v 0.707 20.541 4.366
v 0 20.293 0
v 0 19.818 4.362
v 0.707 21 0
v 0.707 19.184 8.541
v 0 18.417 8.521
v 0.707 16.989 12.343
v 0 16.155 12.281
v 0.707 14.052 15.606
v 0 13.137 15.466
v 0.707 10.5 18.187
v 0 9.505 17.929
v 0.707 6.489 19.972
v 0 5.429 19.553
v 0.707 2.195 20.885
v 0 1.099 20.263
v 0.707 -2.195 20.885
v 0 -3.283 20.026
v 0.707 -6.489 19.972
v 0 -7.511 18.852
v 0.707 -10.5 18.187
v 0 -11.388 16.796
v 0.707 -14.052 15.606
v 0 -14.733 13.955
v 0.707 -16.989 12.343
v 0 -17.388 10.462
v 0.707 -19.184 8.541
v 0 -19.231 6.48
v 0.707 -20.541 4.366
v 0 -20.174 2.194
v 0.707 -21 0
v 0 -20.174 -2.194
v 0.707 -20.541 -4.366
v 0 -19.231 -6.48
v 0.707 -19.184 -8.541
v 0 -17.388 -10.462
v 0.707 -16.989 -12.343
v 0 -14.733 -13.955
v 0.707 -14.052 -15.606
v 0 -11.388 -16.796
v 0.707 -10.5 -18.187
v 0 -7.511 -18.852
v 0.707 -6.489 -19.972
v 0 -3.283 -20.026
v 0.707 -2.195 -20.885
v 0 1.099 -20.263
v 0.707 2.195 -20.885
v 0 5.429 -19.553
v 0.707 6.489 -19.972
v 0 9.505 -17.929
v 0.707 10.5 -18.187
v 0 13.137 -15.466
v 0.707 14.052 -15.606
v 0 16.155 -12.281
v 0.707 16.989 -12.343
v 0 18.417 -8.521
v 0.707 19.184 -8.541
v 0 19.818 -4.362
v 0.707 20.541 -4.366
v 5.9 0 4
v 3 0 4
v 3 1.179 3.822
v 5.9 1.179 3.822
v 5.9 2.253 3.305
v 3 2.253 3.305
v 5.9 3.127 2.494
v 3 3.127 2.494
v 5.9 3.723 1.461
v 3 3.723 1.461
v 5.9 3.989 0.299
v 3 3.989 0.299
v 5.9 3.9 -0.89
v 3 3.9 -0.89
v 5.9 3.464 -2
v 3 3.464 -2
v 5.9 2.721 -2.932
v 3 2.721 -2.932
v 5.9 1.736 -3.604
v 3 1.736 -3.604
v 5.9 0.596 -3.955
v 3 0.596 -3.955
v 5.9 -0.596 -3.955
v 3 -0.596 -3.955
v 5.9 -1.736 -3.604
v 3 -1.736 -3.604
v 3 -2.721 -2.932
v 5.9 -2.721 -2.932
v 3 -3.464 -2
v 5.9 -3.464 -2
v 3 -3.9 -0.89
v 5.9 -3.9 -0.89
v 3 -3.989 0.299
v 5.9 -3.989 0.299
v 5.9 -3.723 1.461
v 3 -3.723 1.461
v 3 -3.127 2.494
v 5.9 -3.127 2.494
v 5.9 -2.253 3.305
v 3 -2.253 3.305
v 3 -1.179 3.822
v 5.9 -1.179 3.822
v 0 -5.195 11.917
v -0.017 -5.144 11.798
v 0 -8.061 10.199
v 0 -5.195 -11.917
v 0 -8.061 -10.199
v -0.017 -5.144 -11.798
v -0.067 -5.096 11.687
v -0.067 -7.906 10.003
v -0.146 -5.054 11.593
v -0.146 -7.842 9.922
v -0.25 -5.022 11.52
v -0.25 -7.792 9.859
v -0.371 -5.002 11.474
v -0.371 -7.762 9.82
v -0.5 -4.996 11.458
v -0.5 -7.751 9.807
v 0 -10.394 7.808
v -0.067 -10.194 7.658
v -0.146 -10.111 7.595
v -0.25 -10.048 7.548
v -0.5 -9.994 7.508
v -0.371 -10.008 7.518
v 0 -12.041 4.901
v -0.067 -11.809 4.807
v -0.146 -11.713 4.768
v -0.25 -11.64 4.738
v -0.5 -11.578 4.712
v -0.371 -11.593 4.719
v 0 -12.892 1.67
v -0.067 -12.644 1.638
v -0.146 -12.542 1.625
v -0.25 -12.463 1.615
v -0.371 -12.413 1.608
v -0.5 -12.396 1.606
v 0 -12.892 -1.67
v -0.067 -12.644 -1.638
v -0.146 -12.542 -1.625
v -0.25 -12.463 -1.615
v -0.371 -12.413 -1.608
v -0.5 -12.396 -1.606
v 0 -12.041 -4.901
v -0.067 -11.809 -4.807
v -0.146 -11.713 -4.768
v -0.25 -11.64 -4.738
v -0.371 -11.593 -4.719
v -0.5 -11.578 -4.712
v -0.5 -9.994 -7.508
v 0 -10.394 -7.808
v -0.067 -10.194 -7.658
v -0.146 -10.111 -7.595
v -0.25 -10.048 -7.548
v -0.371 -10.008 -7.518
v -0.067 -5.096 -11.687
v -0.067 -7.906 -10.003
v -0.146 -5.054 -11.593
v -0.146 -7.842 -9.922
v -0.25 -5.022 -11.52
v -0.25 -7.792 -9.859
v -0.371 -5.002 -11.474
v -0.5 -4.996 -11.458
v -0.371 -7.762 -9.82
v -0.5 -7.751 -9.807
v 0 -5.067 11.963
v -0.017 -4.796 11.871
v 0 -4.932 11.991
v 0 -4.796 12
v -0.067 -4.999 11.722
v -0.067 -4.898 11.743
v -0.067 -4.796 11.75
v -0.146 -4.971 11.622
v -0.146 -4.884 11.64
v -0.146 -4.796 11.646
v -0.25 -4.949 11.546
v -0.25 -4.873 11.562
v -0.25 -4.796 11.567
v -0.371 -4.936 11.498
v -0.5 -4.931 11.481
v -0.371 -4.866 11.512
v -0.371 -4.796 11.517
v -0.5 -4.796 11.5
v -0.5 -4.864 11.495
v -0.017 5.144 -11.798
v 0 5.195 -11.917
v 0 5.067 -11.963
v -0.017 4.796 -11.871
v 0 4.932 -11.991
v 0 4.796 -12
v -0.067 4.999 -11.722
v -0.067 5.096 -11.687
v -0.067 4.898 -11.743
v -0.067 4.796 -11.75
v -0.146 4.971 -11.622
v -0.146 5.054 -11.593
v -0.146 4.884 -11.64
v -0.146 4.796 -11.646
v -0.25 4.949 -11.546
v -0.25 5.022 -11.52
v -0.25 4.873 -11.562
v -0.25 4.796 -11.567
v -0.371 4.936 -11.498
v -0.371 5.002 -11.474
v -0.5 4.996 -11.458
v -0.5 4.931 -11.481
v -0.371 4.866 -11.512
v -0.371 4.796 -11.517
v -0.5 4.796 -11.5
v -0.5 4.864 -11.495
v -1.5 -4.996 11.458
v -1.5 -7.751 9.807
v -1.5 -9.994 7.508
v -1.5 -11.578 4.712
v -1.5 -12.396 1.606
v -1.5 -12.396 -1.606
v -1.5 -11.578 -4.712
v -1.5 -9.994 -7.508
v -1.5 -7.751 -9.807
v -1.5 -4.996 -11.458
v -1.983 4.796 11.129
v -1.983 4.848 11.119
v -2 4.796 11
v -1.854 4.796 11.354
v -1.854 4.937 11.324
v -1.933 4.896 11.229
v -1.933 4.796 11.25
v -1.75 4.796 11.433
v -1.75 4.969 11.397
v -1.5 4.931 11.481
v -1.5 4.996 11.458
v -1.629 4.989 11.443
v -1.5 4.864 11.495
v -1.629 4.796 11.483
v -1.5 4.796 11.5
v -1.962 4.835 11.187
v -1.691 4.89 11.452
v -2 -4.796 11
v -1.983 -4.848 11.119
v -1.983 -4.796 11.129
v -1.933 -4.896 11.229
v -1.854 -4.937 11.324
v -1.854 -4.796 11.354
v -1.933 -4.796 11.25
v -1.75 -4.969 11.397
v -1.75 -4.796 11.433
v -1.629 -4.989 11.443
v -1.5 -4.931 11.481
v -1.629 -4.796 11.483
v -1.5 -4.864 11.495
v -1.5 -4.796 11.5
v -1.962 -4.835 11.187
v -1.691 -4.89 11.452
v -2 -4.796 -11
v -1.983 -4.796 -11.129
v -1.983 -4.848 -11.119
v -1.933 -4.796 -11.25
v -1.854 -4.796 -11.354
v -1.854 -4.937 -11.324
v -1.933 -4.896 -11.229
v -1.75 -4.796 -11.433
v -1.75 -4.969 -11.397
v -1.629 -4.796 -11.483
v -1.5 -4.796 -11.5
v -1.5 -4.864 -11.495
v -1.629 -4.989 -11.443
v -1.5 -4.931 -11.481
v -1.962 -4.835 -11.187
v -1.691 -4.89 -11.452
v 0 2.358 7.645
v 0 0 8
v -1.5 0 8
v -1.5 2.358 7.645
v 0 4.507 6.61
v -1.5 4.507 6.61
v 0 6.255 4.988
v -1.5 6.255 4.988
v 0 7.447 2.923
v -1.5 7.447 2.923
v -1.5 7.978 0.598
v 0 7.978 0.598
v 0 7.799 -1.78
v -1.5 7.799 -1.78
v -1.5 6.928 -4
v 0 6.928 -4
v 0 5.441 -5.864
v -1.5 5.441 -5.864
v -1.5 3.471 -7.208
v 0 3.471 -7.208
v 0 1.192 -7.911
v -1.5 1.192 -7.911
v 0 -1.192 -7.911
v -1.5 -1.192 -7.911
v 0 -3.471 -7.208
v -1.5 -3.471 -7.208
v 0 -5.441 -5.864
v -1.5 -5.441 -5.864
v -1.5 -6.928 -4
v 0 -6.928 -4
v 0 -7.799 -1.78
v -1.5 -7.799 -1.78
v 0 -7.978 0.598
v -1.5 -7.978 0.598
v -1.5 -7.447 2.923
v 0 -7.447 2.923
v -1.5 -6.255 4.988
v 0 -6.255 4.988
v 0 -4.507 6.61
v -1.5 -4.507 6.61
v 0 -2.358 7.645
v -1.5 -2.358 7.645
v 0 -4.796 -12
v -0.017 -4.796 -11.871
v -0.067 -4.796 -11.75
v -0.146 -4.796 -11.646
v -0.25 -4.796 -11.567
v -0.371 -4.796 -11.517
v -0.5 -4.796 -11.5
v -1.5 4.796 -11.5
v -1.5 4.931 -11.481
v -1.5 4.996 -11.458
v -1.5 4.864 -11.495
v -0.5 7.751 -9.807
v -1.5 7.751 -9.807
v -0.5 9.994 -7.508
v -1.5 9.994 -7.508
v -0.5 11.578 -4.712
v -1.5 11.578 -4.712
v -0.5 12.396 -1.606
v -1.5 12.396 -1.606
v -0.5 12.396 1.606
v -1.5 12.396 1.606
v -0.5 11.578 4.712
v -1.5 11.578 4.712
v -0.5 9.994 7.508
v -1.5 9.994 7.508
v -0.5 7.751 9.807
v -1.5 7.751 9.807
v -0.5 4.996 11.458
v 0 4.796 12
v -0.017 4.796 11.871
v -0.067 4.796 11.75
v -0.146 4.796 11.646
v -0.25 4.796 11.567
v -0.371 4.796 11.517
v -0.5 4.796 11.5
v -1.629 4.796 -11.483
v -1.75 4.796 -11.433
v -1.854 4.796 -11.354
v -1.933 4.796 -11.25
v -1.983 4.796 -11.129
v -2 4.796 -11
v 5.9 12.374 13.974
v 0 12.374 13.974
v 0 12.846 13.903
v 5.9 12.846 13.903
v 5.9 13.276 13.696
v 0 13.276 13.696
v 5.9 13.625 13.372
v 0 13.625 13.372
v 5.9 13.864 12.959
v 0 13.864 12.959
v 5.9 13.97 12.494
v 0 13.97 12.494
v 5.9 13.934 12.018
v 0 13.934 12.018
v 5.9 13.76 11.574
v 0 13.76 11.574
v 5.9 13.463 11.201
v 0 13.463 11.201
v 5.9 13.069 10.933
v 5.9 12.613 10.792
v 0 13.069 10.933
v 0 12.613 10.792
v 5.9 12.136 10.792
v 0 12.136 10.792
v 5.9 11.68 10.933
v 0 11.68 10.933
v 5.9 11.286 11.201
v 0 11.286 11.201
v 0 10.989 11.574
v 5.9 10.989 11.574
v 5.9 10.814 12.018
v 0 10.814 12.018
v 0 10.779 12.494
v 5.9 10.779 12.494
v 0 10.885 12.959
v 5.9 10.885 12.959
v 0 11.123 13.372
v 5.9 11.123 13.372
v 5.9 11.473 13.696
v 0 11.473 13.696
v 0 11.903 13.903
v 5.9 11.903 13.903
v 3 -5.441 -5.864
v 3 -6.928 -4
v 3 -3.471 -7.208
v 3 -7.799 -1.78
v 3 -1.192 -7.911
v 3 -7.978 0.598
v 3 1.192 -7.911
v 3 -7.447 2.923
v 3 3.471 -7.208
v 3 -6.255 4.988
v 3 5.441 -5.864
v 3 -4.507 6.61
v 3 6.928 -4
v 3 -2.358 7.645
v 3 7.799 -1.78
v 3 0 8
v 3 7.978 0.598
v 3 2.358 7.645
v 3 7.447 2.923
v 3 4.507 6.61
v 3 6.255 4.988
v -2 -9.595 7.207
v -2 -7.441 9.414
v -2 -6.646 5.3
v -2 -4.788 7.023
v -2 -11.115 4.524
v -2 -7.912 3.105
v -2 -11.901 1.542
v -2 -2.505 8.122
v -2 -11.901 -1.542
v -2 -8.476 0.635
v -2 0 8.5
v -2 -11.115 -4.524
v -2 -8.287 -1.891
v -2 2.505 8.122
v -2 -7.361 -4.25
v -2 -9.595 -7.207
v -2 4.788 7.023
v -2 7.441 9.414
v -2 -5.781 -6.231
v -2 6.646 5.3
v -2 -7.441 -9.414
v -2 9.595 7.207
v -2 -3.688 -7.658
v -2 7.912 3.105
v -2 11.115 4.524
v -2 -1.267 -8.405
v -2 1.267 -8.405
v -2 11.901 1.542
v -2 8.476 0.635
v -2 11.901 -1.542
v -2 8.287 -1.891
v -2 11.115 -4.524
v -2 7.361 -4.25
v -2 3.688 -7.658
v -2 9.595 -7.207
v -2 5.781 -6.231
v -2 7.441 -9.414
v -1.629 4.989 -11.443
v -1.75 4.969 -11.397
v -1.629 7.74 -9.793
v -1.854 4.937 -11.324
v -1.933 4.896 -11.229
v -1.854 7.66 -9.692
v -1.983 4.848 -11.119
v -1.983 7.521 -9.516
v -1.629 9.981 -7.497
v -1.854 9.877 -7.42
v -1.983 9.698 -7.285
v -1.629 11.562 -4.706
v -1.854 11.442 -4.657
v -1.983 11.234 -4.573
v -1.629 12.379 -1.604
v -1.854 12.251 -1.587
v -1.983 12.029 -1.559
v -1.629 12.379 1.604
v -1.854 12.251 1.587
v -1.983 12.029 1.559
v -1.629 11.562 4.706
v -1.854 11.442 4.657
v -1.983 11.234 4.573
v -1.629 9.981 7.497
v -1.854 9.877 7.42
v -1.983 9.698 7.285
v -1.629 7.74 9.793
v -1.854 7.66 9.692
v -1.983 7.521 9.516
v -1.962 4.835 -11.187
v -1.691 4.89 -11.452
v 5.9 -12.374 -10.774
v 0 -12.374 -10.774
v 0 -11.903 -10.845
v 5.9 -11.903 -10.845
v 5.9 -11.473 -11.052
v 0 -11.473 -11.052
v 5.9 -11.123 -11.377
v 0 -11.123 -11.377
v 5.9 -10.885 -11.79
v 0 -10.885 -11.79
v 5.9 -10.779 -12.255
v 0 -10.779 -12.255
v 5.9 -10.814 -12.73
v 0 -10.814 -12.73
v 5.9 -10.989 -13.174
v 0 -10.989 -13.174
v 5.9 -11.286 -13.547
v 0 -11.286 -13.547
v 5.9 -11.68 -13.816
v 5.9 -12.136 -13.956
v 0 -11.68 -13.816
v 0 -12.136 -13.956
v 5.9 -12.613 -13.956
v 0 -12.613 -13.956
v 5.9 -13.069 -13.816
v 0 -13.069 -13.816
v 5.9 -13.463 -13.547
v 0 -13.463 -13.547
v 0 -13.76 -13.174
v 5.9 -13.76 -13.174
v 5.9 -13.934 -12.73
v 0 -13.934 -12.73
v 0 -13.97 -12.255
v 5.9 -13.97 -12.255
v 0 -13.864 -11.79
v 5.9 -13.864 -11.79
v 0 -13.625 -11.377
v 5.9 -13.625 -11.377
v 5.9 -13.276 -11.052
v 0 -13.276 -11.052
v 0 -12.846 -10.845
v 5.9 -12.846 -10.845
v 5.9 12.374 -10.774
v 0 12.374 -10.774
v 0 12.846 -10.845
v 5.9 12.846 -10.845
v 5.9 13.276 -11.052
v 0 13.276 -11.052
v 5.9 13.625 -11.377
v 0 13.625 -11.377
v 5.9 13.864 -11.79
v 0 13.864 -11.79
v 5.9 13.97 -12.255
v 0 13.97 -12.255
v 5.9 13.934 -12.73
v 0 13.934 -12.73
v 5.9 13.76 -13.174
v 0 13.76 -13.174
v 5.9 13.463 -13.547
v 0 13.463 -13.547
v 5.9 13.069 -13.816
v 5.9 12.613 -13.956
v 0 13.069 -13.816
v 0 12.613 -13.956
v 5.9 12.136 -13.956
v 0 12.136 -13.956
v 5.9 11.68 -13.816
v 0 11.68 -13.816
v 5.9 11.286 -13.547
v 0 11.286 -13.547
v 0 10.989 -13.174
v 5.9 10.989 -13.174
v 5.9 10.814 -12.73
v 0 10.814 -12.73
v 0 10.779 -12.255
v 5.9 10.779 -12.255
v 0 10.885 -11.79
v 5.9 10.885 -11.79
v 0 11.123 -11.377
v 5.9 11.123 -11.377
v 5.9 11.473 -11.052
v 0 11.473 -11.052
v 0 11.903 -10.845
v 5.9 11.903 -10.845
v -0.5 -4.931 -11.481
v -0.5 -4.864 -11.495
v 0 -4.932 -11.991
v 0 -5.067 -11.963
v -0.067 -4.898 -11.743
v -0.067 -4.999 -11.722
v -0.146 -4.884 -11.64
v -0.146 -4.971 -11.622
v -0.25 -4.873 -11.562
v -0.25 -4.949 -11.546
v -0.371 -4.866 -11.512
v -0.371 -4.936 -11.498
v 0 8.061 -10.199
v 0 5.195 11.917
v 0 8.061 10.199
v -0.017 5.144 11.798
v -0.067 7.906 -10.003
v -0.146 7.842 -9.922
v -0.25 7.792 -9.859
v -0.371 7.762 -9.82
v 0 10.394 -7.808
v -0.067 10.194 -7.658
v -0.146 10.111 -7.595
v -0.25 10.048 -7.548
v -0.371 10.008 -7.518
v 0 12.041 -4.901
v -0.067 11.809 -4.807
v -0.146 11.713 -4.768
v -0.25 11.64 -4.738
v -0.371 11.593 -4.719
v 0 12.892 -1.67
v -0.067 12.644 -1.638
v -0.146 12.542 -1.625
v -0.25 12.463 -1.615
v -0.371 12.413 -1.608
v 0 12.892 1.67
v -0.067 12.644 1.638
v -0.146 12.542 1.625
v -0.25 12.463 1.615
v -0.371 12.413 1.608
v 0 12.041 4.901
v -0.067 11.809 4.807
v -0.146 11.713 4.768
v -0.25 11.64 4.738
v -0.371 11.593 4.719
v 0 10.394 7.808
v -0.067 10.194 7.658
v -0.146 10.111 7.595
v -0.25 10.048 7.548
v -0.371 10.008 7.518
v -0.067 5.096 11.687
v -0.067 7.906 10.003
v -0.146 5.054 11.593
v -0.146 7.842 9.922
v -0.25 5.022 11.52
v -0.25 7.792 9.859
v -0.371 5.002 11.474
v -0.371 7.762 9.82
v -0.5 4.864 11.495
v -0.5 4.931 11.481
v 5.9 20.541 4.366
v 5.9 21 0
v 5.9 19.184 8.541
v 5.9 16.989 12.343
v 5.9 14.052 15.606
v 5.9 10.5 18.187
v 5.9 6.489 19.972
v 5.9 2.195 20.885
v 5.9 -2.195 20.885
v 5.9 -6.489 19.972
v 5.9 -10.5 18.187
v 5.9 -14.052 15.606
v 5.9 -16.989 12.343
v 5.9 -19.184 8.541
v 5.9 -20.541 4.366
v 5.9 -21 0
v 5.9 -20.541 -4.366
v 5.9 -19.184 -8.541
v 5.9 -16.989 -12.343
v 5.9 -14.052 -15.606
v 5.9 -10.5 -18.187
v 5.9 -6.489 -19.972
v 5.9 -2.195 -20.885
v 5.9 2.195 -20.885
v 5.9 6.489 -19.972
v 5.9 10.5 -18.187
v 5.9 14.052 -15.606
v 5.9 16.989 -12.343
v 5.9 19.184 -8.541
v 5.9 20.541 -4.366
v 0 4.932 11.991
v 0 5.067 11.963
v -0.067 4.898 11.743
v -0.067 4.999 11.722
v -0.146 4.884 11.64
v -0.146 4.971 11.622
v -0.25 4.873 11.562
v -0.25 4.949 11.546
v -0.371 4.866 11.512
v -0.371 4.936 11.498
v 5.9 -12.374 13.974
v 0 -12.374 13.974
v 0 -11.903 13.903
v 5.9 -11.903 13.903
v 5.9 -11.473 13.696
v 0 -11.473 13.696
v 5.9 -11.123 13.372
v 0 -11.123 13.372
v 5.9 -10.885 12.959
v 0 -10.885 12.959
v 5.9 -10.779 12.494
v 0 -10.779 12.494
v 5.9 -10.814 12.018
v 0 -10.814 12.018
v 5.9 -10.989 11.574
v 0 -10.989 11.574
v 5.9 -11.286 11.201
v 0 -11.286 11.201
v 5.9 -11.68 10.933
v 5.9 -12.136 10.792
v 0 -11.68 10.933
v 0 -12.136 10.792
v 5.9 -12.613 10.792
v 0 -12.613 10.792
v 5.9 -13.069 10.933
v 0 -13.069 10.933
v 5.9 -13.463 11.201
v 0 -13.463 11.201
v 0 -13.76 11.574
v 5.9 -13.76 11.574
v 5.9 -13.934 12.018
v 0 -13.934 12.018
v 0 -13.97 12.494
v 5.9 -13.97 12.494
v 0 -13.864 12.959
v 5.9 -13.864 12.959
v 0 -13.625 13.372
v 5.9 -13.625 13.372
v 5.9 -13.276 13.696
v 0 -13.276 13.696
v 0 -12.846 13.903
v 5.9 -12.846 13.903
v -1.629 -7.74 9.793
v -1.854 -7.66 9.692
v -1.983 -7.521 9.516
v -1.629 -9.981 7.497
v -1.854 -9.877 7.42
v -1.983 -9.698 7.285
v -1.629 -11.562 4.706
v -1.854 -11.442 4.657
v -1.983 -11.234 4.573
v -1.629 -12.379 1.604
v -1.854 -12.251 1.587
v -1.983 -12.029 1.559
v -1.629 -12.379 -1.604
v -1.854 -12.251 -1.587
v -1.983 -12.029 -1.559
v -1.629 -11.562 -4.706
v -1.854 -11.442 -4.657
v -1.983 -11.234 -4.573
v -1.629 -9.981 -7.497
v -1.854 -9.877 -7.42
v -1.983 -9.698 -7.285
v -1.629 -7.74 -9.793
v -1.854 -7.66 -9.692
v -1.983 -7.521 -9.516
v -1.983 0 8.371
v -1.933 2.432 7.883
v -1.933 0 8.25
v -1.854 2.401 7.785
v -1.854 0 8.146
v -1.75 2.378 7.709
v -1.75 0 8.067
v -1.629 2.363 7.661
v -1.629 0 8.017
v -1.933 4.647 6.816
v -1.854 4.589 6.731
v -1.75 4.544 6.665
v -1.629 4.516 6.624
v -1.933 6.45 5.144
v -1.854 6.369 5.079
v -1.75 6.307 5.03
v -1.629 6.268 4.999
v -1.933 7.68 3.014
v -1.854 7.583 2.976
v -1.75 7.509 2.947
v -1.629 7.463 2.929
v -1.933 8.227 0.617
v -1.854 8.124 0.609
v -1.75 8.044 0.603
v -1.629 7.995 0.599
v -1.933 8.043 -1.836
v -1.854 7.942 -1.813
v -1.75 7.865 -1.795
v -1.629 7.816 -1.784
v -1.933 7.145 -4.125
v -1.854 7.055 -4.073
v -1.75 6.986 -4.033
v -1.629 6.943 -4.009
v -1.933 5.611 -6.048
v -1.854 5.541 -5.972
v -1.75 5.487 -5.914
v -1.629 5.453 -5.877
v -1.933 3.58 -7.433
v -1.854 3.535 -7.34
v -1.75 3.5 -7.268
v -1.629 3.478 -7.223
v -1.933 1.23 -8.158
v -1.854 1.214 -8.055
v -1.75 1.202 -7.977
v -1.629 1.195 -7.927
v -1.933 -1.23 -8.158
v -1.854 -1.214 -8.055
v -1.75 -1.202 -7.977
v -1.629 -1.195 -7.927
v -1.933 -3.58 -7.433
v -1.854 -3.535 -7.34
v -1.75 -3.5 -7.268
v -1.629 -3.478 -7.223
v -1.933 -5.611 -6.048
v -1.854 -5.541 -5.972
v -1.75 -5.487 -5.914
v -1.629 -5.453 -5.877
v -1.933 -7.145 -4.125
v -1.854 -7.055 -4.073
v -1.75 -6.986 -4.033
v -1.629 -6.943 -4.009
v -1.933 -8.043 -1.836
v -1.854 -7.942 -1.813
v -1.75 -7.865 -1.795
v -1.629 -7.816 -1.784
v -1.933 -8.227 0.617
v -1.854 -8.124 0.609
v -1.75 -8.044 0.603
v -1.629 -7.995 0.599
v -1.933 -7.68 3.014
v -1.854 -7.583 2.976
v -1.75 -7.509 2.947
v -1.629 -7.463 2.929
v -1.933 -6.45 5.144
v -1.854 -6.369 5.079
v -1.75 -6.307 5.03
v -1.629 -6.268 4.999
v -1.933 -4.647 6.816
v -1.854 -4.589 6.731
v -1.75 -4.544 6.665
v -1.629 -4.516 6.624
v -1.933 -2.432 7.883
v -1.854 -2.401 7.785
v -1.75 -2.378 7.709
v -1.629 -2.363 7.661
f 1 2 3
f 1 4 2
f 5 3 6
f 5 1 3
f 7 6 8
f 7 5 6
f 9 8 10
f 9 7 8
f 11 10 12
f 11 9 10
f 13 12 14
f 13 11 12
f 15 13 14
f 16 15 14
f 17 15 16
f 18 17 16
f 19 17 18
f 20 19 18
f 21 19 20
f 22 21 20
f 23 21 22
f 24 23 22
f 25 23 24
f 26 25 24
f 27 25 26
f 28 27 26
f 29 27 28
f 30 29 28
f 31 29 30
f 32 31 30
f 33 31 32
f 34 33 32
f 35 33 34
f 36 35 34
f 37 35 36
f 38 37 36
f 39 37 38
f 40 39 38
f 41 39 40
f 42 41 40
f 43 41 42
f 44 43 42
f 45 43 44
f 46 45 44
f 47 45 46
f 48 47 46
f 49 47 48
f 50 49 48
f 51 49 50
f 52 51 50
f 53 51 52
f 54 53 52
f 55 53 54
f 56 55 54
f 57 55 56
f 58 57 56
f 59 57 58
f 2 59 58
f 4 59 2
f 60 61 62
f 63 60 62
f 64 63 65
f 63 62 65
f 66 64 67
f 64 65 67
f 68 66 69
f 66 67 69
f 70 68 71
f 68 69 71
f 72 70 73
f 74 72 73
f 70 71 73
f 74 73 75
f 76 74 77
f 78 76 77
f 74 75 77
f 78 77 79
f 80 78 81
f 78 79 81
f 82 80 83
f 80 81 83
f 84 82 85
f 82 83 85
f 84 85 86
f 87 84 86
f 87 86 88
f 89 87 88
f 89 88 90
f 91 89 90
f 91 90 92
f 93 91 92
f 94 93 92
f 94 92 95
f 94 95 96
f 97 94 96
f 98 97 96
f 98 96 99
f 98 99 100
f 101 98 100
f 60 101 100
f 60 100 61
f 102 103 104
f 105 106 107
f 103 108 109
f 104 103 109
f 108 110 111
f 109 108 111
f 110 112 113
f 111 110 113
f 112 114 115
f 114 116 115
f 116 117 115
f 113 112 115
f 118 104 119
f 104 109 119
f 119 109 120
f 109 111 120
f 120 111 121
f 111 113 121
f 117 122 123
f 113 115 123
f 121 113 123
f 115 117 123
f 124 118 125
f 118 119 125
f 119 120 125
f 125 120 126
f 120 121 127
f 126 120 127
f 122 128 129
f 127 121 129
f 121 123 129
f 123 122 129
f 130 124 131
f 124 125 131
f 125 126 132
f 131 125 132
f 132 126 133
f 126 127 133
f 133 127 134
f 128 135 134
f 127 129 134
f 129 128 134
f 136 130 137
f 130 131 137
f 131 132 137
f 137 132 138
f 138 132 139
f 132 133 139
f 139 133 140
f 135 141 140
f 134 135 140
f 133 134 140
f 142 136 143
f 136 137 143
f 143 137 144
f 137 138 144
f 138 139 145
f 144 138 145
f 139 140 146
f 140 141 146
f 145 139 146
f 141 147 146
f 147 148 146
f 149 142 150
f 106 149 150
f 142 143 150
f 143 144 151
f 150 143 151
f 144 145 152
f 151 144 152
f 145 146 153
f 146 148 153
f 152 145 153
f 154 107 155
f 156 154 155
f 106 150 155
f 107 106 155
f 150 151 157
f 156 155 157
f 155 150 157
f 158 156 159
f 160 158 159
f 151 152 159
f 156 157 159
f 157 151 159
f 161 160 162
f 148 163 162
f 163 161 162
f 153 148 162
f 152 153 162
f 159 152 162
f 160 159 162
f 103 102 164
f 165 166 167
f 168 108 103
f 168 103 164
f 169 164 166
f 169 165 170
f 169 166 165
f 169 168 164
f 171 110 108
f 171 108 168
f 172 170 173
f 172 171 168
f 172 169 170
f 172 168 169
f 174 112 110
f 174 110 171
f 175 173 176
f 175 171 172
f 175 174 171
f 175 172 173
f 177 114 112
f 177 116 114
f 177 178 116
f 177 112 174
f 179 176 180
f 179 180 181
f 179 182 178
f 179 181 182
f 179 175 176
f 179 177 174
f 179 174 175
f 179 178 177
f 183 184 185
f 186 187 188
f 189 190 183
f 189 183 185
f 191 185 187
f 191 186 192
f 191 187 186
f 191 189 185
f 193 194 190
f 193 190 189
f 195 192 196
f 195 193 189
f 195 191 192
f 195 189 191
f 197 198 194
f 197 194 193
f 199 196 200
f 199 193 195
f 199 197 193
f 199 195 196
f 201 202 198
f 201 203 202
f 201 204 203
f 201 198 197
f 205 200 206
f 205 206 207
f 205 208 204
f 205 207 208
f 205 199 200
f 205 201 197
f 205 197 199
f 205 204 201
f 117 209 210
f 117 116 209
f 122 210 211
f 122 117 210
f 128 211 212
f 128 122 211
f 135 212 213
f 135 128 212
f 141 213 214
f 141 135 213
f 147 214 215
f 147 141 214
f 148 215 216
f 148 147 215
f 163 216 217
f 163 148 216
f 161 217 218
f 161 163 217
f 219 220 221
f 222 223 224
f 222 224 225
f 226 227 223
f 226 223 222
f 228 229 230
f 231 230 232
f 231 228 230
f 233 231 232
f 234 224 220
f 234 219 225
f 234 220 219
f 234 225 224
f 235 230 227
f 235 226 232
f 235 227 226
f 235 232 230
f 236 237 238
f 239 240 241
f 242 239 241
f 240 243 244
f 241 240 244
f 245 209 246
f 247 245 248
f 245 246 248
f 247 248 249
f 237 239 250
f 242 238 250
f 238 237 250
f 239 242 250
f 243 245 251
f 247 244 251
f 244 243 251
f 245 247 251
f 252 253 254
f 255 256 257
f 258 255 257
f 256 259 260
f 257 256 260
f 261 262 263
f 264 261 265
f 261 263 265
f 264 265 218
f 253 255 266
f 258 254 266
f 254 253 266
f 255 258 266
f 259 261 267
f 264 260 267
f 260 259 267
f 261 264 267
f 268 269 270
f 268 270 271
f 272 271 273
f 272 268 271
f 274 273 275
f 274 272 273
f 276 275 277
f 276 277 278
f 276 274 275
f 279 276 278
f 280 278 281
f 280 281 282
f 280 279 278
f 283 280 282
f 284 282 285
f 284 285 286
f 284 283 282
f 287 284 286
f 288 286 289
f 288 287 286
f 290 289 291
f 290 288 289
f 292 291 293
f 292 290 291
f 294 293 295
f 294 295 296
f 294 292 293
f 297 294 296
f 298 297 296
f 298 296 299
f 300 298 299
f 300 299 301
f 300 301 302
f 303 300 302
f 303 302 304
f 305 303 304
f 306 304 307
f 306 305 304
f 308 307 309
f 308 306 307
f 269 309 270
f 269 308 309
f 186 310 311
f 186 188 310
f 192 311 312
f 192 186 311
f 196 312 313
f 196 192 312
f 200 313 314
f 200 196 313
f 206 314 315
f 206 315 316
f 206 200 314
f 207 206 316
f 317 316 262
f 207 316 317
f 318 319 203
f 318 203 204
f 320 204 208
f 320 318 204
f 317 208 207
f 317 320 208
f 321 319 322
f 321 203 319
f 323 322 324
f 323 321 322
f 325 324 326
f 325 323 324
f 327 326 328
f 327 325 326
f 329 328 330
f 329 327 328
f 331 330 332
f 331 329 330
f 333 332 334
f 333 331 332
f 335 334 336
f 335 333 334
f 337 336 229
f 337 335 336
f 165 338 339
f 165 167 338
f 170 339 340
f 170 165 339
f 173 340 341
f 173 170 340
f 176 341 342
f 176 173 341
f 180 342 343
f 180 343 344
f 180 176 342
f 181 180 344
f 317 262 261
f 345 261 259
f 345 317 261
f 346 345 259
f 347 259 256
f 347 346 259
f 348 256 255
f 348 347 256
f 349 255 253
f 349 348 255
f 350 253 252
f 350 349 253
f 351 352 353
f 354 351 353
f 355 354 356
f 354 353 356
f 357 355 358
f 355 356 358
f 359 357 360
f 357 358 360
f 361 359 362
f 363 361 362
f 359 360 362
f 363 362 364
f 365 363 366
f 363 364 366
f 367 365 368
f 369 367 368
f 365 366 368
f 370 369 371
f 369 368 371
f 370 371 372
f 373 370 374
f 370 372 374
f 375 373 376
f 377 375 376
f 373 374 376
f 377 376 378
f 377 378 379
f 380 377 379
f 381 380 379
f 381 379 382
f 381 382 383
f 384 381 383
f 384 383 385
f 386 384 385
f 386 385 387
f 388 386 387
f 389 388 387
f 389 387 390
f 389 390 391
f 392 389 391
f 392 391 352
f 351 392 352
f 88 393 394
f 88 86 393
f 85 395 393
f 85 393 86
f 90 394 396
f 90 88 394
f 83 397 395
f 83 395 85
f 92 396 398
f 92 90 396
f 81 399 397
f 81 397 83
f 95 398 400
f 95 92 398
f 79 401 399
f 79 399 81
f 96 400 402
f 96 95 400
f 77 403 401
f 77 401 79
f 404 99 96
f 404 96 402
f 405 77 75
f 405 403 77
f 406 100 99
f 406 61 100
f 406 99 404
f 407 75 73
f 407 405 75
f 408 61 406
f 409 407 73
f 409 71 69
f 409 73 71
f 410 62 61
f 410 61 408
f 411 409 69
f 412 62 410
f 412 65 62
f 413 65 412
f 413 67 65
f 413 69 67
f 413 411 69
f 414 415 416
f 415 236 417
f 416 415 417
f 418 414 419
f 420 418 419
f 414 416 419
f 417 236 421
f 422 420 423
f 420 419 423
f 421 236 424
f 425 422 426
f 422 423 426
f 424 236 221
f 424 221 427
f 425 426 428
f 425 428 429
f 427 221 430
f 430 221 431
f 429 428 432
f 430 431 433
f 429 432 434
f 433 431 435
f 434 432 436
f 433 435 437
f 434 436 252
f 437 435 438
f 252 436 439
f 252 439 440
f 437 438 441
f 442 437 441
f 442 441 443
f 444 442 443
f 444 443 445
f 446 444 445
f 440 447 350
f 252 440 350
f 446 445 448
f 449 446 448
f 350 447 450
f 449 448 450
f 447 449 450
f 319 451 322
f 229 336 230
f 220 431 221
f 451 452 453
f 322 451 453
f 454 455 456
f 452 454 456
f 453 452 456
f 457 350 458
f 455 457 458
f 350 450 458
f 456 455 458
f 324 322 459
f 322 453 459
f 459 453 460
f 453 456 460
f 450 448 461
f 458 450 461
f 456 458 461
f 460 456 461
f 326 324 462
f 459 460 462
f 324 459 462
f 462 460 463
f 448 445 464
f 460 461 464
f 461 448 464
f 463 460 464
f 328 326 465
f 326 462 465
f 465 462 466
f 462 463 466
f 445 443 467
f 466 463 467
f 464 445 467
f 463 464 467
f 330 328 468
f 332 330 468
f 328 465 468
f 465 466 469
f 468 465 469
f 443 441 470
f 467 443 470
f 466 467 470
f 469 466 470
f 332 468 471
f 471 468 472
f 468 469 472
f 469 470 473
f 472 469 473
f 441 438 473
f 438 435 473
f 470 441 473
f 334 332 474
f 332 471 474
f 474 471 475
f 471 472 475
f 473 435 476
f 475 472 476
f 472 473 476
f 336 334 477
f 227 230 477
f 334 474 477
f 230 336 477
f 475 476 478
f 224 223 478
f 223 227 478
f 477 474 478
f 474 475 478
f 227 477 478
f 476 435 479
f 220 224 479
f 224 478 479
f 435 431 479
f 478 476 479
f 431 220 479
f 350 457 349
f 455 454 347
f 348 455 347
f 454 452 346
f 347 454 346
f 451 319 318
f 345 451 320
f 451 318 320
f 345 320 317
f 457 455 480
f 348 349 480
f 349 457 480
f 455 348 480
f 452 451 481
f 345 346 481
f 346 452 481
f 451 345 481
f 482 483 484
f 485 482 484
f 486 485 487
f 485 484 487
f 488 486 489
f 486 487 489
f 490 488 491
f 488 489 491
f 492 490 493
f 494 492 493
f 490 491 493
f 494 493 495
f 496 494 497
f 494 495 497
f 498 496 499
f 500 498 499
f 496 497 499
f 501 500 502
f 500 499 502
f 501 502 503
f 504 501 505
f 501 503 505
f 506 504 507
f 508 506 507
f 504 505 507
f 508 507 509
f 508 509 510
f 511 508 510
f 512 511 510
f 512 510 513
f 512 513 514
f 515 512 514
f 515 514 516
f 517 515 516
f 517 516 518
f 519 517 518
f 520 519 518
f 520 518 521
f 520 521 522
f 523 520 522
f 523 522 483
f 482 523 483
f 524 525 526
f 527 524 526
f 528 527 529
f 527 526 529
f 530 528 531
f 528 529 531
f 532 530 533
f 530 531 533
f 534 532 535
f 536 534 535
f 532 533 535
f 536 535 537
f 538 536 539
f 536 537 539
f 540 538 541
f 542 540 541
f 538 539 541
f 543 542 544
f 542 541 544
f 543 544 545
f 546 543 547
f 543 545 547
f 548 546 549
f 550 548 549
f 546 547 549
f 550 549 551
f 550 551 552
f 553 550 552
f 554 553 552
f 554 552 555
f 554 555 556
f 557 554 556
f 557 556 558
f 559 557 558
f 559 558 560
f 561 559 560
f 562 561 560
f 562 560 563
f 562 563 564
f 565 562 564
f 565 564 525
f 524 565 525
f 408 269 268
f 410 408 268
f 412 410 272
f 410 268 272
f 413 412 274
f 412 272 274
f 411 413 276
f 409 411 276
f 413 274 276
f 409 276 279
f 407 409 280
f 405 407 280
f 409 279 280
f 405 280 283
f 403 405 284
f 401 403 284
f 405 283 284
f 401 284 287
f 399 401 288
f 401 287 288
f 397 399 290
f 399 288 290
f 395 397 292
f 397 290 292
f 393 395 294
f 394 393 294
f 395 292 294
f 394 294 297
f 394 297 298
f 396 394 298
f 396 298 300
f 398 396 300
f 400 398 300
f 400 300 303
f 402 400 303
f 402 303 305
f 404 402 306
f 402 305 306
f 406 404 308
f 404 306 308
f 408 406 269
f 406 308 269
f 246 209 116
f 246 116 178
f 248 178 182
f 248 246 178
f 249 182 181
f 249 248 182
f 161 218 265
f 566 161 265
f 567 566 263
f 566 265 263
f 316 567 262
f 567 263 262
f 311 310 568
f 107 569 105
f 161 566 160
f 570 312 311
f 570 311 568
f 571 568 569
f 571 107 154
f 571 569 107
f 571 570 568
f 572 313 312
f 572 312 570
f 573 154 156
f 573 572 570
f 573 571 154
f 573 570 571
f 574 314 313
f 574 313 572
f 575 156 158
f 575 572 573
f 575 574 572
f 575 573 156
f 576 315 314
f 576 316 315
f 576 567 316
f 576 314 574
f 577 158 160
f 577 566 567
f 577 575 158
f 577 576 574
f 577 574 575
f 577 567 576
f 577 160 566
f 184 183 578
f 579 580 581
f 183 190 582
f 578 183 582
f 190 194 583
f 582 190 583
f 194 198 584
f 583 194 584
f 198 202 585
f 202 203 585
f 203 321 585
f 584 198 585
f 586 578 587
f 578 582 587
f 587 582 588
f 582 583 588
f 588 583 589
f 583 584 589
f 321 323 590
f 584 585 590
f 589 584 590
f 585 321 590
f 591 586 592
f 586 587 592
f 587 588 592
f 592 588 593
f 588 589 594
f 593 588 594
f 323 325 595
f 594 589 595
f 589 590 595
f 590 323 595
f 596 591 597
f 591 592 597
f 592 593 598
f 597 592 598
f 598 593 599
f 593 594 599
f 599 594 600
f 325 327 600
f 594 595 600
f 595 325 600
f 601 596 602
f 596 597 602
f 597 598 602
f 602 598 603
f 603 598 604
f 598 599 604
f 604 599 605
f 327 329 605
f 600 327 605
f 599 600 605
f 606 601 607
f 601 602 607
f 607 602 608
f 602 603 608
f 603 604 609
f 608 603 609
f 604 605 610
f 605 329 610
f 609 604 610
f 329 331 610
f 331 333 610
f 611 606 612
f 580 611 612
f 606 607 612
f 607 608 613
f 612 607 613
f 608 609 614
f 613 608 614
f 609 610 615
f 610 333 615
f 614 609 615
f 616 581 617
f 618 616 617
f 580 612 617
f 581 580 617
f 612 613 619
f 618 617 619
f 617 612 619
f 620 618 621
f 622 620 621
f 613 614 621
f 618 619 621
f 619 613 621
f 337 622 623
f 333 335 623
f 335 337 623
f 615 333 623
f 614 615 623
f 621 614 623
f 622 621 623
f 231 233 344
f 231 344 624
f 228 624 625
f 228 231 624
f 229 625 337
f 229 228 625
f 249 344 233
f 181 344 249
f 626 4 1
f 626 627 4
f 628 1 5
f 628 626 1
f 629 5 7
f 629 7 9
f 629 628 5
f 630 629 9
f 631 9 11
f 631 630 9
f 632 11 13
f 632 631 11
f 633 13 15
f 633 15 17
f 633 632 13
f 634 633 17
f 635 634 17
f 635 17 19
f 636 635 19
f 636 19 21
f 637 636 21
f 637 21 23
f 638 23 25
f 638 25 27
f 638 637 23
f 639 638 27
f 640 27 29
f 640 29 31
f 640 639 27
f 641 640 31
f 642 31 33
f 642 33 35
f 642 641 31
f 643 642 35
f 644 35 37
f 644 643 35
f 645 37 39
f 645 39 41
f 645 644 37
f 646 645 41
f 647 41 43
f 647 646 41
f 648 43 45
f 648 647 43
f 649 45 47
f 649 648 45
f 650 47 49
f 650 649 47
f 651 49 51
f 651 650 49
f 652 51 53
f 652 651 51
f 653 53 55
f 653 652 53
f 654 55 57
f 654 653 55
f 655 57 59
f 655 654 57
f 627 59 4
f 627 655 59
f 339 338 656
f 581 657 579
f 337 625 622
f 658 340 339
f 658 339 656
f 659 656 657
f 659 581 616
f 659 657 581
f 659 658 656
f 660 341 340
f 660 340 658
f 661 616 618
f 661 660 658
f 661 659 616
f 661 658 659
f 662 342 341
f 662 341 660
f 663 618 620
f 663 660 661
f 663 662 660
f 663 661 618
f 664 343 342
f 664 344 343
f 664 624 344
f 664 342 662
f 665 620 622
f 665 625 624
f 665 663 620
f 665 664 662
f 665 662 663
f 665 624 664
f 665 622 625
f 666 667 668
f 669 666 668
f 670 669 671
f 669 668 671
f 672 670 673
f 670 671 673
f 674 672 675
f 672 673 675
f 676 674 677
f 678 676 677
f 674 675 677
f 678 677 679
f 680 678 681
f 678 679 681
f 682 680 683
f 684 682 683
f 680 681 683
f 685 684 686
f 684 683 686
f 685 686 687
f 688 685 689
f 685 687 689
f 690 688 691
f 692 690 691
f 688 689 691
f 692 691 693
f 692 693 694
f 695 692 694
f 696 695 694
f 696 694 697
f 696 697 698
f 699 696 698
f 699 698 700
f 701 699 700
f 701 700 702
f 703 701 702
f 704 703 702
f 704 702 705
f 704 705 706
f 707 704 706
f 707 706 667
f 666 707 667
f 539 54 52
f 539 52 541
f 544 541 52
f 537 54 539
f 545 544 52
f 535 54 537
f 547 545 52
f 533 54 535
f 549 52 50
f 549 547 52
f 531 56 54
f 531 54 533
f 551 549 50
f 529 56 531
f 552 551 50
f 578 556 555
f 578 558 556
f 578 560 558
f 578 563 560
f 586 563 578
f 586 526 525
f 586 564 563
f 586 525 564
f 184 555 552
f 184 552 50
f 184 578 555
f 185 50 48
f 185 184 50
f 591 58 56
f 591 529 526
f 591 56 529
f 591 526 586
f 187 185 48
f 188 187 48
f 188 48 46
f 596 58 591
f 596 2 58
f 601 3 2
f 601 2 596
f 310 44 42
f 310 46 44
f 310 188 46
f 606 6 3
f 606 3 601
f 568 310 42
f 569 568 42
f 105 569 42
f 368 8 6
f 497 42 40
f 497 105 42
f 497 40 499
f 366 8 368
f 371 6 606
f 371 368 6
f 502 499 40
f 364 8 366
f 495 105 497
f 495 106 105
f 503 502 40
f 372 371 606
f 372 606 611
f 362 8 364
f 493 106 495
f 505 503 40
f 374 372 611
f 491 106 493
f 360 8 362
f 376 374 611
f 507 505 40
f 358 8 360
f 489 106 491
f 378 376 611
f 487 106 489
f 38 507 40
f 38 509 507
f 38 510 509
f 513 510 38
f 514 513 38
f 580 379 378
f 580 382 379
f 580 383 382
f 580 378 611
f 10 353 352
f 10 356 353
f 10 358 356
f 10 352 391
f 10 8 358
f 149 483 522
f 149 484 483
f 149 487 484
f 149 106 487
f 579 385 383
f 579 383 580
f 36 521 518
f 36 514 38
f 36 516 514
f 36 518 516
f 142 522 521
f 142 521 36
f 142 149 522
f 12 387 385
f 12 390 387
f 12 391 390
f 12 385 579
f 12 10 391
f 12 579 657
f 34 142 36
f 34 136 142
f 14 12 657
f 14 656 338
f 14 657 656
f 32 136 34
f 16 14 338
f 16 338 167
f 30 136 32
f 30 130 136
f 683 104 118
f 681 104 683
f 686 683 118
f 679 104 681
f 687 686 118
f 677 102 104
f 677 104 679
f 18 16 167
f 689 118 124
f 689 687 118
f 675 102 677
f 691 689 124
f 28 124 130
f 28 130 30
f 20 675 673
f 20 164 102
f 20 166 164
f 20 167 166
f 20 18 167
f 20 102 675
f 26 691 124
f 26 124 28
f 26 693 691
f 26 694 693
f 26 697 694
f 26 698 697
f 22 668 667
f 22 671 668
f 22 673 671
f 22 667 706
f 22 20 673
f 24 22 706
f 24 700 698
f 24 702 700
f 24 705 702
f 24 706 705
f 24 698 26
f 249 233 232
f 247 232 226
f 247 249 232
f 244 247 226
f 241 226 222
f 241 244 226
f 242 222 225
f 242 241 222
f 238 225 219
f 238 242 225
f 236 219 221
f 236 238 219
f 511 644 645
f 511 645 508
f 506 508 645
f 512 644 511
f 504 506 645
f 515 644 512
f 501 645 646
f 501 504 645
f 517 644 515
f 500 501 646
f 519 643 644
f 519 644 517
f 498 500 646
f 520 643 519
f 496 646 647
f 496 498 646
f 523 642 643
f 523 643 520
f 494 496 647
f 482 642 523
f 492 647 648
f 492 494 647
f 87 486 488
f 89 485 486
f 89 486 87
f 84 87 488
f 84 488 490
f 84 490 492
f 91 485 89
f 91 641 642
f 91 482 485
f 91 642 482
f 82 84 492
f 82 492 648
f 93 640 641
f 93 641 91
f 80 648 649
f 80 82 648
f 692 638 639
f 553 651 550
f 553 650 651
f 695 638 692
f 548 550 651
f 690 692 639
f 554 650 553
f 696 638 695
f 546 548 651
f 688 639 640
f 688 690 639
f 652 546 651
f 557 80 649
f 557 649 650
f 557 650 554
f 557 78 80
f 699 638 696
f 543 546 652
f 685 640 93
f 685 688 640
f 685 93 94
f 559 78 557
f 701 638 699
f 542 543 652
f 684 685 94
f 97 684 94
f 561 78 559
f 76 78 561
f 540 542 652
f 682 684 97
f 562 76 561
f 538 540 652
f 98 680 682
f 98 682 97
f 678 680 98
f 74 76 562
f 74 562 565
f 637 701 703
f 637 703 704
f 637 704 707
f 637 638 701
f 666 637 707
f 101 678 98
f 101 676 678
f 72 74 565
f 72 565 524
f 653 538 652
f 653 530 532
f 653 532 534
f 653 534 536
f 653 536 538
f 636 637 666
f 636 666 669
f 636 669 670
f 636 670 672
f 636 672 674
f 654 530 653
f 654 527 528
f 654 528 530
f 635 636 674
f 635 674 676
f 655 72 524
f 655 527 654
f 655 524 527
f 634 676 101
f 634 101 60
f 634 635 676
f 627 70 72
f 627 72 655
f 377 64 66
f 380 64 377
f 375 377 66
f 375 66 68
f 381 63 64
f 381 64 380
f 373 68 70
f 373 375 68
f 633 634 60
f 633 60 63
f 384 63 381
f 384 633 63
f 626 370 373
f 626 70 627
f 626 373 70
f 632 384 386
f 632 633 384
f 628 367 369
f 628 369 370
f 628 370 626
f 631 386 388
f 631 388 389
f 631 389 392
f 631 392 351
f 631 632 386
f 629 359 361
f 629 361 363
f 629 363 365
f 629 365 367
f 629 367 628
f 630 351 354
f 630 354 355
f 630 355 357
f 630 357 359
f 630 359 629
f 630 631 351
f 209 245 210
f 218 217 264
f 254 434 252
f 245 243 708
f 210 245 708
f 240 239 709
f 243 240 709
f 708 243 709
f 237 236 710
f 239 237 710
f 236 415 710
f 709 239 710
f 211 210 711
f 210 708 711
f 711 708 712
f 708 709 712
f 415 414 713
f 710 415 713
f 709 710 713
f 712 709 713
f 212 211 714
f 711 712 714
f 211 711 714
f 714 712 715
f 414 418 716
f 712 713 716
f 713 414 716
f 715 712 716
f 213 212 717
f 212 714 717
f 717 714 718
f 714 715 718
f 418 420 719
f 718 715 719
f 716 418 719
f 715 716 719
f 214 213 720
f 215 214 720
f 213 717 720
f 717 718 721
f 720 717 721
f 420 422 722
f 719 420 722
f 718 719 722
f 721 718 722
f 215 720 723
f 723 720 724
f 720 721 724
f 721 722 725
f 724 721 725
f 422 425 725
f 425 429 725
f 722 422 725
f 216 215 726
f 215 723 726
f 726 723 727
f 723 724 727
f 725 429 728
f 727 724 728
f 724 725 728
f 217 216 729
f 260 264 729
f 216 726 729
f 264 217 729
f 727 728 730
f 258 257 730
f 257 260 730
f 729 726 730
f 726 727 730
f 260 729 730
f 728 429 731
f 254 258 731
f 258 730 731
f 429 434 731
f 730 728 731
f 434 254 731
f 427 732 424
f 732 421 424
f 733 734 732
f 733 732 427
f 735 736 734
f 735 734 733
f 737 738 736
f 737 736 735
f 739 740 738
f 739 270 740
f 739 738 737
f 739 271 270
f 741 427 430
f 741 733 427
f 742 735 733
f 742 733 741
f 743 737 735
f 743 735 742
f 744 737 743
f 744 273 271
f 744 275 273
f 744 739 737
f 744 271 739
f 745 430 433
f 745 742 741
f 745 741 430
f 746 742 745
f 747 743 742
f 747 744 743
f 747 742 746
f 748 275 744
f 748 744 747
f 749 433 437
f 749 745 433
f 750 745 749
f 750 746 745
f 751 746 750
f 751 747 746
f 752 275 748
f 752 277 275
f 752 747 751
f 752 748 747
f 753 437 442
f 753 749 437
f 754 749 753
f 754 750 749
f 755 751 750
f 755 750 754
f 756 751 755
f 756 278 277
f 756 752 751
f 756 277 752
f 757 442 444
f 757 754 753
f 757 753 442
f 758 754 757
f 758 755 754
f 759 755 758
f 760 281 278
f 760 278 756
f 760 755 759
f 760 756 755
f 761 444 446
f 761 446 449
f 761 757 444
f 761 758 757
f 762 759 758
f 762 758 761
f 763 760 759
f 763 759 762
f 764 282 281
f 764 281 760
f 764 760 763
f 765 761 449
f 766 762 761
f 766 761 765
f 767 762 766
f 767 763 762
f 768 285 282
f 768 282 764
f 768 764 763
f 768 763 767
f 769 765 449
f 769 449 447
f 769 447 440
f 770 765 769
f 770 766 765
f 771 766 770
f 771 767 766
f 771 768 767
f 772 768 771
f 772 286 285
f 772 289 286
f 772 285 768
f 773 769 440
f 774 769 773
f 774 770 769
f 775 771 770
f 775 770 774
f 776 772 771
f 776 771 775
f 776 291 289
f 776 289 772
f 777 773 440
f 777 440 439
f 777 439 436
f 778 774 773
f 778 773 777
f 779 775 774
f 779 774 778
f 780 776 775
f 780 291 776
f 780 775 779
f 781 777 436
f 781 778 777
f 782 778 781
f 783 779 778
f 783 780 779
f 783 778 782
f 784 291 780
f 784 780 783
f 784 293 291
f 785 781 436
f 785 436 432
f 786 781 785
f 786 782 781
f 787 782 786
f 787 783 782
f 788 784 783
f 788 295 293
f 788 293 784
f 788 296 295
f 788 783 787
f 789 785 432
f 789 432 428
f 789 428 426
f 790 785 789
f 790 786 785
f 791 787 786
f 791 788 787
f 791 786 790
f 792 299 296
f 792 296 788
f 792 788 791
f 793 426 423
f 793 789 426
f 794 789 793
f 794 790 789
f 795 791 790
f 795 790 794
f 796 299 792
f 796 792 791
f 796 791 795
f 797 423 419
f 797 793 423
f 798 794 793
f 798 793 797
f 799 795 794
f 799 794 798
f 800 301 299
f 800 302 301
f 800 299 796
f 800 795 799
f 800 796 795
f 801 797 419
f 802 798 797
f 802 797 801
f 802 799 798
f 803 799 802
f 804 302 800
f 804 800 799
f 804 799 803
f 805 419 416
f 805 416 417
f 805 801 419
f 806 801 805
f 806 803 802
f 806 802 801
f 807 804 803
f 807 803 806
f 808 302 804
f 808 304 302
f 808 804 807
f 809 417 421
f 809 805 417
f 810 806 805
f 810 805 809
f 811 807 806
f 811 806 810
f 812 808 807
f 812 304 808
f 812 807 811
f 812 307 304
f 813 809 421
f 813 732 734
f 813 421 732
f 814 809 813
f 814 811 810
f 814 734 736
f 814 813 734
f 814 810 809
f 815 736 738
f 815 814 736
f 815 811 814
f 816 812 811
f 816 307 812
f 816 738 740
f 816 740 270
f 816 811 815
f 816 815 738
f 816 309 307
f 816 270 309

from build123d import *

# Parameters (mm, degrees)
SKETCH2_R           = 8
BOSS_EXTRUDE1_DEPTH = 2
FILLET1_R           = 0.5
SKETCH3_R           = 1.6
CUT_EXTRUDE1_DEPTH  = 10
SKETCH4_R           = 4
CUT_EXTRUDE2_DEPTH  = 10
SKETCH5_R           = 8
CUT_EXTRUDE3_DEPTH  = 3


with BuildPart() as part:
    # Sketch1 → Revolve1 (revolve)
    with BuildSketch(Plane.XY):
        Polygon((0, 0), (0, 20.292893219), (0.707106781, 21), (5.9, 21), (5.9, 0), align=None)
    revolve(axis=Axis((0, 0, 0), (1, 0, 0)))

    # Sketch2 → Boss-Extrude1 (add)
    with BuildSketch(Plane.ZY):
        with BuildLine():
            Line((-11.5, -4.898979486), (-11.5, 4.898979486))
            ThreePointArc((-11.5, 4.898979486), (0, 12.5), (11.5, 4.898979486))
            Line((11.5, 4.898979486), (11.5, -4.898979486))
            ThreePointArc((11.5, -4.898979486), (0, -12.5), (-11.5, -4.898979486))
        make_face()
        Circle(SKETCH2_R, mode=Mode.SUBTRACT)
    extrude(amount=BOSS_EXTRUDE1_DEPTH)

    # Fillet1
    fillet1_edges = [part.edges().sort_by_distance(p)[0] for p in [
        (-2, 12.5, 0),
        (-2, 0, -11.5),
        (-2, -12.5, 0),
        (-2, 0, 11.5),
        (0, 12.5, 0),
        (-1, 4.898979486, 11.5),
        (0, 0, -11.5),
        (-1, 4.898979486, -11.5),
        (0, -12.5, 0),
        (-1, -4.898979486, -11.5),
        (0, 0, 11.5),
        (-1, -4.898979486, 11.5),
        (-2, 0, -8),
    ]]
    fillet(fillet1_edges, radius=FILLET1_R)

    # Sketch3 → Cut-Extrude1 (cut)
    with BuildSketch(Plane.ZY):
        with Locations((12.374368671, 12.374368671)):
            Circle(SKETCH3_R)
        with Locations((-12.374368671, 12.374368671)):
            Circle(SKETCH3_R)
        with Locations((-12.374368671, -12.374368671)):
            Circle(SKETCH3_R)
        with Locations((12.374368671, -12.374368671)):
            Circle(SKETCH3_R)
    extrude(amount=-CUT_EXTRUDE1_DEPTH, mode=Mode.SUBTRACT)

    # Sketch4 → Cut-Extrude2 (cut)
    with BuildSketch(Plane.ZY):
        Circle(SKETCH4_R)
    extrude(amount=-CUT_EXTRUDE2_DEPTH, mode=Mode.SUBTRACT)

    # Sketch5 → Cut-Extrude3 (cut)
    with BuildSketch(Plane.ZY):
        Circle(SKETCH5_R)
    extrude(amount=-CUT_EXTRUDE3_DEPTH, mode=Mode.SUBTRACT)


solid = part.part
